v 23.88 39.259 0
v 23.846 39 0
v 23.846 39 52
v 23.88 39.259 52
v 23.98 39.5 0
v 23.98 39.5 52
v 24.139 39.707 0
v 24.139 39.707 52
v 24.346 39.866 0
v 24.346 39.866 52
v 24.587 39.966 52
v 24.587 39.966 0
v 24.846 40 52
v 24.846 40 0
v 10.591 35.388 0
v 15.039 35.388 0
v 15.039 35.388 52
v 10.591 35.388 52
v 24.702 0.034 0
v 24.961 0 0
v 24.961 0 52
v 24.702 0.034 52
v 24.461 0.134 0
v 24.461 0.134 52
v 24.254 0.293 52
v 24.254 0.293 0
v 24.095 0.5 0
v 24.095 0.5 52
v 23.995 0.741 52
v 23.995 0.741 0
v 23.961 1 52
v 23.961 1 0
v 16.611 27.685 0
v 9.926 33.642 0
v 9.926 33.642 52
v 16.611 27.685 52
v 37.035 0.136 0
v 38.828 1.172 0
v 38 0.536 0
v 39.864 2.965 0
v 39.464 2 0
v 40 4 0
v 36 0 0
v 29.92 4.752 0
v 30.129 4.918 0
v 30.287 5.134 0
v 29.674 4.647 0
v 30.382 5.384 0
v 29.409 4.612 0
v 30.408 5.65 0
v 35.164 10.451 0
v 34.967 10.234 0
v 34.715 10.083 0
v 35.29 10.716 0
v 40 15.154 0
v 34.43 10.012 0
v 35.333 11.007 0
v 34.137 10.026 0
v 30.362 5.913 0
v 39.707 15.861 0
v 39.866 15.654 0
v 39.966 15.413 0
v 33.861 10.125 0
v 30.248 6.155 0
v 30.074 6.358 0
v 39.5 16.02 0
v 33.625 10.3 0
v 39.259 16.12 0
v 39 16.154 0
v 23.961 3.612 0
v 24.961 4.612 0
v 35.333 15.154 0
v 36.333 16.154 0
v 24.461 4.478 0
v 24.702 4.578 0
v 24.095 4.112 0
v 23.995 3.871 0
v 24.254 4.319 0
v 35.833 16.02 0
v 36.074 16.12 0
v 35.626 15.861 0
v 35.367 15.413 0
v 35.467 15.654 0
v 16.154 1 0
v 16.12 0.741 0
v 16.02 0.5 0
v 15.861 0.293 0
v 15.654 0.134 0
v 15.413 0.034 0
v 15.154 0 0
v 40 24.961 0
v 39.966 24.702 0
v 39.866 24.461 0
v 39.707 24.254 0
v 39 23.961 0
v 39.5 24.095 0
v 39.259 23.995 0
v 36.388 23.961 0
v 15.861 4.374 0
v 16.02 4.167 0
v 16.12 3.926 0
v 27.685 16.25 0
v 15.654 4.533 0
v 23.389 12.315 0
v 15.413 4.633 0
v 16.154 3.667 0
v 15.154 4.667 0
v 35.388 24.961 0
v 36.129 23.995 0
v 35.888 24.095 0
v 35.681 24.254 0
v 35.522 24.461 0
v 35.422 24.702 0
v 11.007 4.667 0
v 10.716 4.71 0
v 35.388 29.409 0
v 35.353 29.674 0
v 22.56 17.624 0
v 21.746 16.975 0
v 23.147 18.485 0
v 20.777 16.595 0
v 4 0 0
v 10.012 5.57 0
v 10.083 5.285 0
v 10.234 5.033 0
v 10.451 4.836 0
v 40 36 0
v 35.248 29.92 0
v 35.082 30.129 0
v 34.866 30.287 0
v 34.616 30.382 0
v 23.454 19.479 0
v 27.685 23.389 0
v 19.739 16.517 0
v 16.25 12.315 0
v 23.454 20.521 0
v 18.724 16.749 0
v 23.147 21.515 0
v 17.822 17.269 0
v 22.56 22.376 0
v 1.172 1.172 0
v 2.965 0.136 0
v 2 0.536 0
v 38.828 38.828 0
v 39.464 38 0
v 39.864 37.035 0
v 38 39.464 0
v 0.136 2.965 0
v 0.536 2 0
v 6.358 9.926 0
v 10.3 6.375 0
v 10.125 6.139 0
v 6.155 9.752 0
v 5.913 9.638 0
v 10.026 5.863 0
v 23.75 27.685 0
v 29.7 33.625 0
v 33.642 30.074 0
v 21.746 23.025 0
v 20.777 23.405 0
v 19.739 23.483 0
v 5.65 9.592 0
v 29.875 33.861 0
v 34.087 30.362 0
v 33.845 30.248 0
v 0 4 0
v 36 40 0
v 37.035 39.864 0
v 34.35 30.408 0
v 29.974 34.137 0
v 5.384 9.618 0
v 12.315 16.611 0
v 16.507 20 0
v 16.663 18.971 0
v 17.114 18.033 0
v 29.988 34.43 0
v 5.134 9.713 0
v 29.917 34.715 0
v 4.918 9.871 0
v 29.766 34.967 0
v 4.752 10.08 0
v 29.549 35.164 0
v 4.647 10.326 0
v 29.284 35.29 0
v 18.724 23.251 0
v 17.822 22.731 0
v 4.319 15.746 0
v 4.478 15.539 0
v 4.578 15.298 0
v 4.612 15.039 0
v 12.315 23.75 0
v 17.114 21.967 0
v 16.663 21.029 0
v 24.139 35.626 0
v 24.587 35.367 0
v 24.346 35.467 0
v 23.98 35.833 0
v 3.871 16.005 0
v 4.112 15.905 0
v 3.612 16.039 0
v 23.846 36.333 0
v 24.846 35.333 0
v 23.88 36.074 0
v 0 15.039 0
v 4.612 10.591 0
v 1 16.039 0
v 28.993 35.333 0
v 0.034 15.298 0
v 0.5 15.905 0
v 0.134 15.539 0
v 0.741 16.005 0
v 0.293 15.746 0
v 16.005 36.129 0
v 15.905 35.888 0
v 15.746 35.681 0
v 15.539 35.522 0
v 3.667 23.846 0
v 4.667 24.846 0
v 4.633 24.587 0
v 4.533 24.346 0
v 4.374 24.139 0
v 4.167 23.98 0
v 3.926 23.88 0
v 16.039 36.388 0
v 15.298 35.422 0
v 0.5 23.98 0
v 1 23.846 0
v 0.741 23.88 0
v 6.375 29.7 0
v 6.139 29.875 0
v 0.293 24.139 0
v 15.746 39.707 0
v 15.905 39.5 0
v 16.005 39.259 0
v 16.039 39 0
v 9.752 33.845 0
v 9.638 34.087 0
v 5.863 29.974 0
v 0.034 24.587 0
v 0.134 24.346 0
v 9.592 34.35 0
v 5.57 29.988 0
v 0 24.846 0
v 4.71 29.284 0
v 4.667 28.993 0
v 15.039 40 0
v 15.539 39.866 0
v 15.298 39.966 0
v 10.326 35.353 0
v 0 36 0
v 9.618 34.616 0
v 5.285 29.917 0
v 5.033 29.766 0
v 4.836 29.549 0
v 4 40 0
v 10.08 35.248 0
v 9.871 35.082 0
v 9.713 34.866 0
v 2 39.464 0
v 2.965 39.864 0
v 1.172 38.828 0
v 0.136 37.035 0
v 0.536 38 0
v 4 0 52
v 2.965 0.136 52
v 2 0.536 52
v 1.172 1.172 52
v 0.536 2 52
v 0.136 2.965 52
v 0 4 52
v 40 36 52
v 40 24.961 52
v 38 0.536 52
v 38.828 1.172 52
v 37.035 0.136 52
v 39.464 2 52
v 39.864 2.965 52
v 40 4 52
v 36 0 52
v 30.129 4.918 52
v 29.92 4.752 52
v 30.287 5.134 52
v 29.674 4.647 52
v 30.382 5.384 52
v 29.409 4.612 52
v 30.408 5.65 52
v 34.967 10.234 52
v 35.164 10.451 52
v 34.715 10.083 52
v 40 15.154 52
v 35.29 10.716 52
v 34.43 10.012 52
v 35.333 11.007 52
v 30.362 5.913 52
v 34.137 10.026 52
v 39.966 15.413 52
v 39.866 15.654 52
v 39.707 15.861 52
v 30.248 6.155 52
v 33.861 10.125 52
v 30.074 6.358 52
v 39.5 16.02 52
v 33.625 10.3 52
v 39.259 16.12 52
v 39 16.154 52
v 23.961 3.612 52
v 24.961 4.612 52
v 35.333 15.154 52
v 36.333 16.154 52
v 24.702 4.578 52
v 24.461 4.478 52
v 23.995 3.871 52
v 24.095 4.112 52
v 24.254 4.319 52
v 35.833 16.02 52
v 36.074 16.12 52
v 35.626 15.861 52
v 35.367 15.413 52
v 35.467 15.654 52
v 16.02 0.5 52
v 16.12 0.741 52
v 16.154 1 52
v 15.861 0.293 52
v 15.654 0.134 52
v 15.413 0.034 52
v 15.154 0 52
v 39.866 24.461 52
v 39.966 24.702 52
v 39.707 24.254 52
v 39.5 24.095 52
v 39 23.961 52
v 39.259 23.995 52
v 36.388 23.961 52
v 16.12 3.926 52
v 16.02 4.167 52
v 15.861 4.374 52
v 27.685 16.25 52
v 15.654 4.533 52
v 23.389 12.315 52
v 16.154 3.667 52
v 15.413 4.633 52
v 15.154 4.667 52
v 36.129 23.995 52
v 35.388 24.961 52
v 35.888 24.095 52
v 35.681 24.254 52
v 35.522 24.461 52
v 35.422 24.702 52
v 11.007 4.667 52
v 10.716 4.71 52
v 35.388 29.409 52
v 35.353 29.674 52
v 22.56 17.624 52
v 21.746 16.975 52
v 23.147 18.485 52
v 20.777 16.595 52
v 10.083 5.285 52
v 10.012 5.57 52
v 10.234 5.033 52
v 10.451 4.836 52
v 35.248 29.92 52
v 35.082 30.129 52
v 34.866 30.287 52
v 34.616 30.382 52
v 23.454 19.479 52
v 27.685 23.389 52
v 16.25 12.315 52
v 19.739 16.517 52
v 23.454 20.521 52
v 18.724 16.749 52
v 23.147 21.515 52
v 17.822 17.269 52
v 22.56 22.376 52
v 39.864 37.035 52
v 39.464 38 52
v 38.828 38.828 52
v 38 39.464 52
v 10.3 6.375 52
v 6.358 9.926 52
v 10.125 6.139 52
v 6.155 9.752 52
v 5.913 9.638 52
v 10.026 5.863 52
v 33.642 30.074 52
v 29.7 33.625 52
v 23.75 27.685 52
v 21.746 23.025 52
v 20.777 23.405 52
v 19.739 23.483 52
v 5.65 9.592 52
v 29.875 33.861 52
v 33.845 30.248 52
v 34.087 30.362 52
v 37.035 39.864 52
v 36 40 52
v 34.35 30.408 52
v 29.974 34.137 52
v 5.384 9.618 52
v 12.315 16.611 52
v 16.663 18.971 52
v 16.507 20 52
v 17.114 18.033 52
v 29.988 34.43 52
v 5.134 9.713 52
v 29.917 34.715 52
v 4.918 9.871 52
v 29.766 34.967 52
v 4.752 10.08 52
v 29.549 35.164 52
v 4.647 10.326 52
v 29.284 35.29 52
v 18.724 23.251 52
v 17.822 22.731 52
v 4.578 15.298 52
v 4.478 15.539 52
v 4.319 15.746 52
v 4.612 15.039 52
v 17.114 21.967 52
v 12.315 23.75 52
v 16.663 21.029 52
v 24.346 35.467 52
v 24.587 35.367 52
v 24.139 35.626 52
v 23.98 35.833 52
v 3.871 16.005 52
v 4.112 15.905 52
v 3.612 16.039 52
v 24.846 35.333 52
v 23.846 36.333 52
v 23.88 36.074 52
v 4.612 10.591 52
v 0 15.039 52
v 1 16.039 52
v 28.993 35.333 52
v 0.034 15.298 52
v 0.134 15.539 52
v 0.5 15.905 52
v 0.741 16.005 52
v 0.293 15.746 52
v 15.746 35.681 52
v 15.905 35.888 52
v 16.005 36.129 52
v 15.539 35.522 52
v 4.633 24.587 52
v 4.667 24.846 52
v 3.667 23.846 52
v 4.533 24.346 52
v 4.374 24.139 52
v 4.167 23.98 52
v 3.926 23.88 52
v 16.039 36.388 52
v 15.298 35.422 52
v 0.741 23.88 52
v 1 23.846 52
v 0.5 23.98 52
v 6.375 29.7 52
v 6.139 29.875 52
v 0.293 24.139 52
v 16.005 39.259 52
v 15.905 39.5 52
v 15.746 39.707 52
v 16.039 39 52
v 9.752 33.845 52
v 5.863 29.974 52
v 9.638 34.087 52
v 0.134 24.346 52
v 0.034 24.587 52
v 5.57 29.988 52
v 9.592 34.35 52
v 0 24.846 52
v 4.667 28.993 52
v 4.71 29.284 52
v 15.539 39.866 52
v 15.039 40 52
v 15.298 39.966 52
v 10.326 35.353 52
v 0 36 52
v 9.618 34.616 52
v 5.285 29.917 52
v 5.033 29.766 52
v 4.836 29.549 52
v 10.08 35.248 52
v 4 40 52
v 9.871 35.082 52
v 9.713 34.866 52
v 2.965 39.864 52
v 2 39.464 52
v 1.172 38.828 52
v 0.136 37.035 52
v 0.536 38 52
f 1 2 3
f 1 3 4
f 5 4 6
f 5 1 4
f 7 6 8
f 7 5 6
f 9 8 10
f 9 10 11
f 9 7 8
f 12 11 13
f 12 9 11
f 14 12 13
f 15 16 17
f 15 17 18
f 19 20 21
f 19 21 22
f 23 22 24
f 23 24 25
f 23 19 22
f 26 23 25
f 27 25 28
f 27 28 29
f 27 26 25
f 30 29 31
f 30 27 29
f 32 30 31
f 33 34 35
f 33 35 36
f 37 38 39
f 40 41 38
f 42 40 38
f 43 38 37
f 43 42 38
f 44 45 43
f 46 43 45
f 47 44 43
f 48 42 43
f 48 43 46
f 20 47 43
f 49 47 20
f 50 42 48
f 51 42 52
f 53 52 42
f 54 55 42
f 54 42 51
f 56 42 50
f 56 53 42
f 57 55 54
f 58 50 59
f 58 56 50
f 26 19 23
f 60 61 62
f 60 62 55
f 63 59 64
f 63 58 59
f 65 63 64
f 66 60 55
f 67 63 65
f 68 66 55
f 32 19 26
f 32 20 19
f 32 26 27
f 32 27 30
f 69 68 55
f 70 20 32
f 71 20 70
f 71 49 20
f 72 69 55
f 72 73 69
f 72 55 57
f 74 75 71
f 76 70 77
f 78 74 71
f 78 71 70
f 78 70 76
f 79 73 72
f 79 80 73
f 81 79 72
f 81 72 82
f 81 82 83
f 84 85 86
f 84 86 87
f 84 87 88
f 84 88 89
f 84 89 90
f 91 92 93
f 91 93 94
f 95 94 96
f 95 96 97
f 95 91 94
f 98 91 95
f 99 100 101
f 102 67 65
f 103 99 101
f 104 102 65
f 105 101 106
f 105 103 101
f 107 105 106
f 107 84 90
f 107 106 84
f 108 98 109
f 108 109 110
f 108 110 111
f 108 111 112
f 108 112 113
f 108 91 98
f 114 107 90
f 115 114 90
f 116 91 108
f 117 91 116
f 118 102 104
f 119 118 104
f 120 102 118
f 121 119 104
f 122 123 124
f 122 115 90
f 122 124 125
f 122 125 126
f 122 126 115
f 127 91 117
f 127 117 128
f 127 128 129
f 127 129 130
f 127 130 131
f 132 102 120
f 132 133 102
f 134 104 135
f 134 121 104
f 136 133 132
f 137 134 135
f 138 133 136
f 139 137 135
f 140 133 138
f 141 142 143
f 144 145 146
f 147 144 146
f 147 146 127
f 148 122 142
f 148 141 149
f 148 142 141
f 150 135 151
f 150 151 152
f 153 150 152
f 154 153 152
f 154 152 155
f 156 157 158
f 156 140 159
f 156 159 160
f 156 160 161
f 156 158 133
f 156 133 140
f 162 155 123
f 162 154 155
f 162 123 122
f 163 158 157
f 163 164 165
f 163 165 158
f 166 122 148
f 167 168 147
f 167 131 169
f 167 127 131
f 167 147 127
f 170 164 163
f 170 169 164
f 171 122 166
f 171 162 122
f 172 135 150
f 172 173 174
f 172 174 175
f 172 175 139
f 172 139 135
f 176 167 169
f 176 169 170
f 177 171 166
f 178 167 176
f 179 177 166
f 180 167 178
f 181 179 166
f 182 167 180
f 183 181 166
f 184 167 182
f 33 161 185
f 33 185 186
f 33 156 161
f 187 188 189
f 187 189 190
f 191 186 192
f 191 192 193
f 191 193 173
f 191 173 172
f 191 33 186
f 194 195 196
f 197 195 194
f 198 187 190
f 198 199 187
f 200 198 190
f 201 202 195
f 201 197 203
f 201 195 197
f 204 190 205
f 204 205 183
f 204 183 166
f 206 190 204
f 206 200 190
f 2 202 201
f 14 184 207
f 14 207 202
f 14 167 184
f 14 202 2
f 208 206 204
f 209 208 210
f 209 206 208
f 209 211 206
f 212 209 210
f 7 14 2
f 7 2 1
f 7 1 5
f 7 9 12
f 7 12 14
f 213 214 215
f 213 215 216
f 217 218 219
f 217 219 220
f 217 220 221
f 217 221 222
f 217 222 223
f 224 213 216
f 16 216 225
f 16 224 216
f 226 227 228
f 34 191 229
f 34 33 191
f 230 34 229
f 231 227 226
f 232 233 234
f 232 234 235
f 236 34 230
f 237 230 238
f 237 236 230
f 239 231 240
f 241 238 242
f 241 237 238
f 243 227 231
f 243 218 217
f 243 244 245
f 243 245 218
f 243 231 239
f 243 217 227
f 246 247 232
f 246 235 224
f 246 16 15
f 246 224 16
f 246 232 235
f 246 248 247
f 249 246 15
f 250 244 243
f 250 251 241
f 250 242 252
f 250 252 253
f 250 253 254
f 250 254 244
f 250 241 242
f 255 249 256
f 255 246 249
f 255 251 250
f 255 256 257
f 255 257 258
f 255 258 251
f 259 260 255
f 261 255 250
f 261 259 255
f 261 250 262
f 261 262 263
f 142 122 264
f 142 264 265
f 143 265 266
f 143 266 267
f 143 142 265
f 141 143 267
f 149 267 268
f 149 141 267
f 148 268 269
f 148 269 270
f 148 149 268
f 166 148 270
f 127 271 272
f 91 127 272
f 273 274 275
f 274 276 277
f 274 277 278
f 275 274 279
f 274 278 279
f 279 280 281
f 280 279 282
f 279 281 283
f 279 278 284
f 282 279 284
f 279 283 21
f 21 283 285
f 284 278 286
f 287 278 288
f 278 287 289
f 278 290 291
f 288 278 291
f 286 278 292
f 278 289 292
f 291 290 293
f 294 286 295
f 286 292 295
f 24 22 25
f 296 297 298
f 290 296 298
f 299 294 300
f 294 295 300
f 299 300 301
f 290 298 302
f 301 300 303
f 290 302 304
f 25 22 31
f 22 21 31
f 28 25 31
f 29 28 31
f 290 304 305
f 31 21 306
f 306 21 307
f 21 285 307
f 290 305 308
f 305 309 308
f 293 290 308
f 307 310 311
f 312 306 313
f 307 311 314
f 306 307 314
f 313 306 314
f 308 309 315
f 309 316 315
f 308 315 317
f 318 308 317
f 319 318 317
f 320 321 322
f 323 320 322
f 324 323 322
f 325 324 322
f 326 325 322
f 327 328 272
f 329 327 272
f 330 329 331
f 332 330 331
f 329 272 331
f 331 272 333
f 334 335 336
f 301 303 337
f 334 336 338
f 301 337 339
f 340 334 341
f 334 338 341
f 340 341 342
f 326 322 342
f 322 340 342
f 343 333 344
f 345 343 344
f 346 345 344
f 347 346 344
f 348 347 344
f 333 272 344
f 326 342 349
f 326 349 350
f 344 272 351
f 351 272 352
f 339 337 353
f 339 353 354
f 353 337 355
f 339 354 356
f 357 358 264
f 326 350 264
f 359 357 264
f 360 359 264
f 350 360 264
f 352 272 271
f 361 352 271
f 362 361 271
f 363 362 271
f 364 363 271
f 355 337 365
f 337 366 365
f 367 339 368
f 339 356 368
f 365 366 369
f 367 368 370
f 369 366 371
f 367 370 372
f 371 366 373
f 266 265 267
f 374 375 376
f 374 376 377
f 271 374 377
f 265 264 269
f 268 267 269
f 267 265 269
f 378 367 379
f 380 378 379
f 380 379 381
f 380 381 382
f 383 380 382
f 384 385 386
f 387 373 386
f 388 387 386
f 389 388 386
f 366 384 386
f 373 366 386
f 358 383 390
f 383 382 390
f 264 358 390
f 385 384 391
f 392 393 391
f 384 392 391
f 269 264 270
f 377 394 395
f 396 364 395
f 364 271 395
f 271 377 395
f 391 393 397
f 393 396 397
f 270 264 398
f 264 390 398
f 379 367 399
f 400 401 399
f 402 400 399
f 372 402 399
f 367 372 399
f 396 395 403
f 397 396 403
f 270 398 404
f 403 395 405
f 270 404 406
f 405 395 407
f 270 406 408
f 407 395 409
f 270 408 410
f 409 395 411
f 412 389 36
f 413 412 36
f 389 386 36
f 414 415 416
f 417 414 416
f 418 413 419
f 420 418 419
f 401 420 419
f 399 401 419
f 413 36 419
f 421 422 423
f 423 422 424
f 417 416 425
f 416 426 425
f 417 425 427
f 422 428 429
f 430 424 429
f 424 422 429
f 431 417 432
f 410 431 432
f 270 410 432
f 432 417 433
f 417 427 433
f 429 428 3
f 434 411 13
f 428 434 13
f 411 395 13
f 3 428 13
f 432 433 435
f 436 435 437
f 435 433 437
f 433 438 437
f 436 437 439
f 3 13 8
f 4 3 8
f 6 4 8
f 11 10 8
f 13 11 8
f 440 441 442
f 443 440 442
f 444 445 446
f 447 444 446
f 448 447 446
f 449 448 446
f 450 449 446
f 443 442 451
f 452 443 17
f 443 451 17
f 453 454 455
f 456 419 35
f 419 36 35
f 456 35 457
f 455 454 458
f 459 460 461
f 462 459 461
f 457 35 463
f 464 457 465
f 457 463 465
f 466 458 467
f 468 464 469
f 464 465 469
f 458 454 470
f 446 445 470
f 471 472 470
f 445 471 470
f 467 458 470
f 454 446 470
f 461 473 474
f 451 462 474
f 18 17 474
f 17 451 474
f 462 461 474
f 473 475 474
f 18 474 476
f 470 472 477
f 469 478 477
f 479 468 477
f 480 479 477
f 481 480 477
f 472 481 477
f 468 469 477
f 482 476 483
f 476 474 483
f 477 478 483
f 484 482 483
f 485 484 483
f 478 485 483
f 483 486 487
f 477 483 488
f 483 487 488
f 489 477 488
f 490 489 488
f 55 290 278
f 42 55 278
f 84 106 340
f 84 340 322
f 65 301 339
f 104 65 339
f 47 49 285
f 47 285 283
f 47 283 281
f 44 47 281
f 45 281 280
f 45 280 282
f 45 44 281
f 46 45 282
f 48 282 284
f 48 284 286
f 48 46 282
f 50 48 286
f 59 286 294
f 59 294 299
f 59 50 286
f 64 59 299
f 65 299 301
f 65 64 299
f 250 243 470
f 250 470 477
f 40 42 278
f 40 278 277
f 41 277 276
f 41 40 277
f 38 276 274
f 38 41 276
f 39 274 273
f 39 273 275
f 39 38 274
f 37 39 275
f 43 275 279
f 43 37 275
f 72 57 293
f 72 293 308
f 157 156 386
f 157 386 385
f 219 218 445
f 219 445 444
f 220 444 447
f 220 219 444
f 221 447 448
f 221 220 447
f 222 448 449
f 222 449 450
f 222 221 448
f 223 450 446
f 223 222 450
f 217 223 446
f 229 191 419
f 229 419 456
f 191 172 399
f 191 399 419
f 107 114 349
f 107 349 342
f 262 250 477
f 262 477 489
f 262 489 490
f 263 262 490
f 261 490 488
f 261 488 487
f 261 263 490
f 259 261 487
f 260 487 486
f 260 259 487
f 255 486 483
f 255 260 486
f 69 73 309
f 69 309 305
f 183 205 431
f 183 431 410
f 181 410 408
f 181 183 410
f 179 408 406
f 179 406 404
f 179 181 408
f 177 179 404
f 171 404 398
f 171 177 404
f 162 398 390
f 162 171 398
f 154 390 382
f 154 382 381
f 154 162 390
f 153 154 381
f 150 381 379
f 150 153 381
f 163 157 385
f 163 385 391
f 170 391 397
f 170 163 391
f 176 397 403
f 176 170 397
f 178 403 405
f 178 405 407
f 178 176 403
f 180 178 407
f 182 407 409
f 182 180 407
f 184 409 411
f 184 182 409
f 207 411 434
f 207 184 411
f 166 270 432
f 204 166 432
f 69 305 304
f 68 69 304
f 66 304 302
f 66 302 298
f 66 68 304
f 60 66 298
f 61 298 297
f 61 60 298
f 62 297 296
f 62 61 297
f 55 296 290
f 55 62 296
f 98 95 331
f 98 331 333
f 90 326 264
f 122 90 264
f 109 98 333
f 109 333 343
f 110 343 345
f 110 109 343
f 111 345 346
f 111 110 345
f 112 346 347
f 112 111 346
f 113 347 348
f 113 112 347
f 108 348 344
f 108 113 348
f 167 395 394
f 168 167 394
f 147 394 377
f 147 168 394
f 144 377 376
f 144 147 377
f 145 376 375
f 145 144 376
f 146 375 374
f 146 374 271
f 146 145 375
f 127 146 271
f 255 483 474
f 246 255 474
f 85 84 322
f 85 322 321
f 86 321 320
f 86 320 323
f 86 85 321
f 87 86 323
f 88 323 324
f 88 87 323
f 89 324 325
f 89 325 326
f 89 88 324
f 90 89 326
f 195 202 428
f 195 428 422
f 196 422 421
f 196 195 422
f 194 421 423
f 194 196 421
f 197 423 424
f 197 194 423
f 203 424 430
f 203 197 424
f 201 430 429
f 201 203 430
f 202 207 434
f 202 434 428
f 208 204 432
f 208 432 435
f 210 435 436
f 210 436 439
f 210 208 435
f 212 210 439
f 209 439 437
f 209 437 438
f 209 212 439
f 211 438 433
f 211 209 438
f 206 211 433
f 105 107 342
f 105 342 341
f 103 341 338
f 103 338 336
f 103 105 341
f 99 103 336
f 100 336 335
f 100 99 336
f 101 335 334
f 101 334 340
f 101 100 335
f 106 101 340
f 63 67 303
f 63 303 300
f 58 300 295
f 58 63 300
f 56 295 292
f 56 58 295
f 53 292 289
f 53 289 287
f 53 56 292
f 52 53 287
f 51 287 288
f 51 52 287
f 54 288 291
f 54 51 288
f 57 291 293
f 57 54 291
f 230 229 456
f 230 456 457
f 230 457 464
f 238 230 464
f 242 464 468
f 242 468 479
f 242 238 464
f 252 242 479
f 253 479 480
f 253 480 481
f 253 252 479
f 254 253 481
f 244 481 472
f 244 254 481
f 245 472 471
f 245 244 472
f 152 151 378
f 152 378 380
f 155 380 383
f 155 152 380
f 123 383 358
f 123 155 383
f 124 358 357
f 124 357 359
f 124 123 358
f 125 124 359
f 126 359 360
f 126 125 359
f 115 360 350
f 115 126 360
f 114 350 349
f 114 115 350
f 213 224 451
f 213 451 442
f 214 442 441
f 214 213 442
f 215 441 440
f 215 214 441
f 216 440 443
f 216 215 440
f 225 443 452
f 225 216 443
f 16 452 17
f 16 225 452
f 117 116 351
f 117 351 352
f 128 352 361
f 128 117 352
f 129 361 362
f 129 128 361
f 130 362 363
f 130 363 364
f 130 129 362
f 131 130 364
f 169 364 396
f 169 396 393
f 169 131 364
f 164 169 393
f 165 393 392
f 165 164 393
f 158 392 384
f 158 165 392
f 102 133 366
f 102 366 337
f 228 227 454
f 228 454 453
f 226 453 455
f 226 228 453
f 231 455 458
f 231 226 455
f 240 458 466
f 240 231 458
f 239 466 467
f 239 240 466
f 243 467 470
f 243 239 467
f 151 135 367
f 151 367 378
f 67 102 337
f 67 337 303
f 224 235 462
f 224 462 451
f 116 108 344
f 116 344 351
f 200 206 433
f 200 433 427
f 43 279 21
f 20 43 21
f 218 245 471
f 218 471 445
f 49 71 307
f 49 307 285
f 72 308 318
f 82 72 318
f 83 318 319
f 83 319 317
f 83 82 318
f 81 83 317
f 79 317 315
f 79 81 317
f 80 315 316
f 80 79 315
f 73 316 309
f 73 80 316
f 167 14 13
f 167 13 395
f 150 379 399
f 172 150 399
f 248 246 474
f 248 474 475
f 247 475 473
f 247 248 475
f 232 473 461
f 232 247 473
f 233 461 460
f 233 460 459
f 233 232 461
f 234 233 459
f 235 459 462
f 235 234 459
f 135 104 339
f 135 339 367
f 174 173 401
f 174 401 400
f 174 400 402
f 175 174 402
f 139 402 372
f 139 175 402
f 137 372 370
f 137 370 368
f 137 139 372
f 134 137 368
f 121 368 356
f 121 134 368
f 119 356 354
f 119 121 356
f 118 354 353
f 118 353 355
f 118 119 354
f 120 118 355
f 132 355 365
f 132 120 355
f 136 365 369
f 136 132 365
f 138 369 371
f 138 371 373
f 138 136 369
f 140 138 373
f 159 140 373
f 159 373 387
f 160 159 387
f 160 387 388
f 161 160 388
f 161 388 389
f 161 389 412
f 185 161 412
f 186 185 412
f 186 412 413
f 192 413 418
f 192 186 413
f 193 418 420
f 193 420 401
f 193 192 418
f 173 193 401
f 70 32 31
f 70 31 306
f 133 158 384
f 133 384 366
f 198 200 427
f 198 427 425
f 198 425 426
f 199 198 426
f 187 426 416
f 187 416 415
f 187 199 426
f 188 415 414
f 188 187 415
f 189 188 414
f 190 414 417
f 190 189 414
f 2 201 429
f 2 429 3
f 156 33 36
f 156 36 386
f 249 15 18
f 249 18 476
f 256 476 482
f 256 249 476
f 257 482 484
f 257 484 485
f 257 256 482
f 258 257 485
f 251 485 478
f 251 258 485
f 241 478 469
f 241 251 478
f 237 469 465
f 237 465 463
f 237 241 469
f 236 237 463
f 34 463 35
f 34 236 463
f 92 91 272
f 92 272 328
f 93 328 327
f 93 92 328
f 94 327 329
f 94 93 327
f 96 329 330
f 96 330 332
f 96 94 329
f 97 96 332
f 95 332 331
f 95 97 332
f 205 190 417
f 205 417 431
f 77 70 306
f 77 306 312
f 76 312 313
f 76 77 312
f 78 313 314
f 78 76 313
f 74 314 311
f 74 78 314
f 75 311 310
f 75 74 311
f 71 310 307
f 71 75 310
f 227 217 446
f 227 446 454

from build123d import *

# Parameters (mm, degrees)
SKETCH2_R           = 3.492543695
BOSS_EXTRUDE1_DEPTH = 52


with BuildPart() as part:
    # Sketch2 → Boss-Extrude1 (new body)
    with BuildSketch(Plane.XY):
        with BuildLine():
            Line((19.48831917, 27.684671829), (23.749889801, 27.684671829))
            Line((23.749889801, 27.684671829), (29.699681879, 33.624984685))
            ThreePointArc((29.699681879, 33.624984685), (29.917171057, 34.714970099), (28.993139054, 35.332654972))
            Line((28.993139054, 35.332654972), (24.845630957, 35.332654972))
            ThreePointArc((24.845630957, 35.332654972), (24.138524175, 35.625548191), (23.845630957, 36.332654972))
            Line((23.845630957, 36.332654972), (23.845630957, 39))
            ThreePointArc((23.845630957, 39), (24.138524175, 39.707106781), (24.845630957, 40))
            Line((24.845630957, 40), (36, 40))
            ThreePointArc((36, 40), (38.828427125, 38.828427125), (40, 36))
            Line((40, 36), (40, 24.961087436))
            ThreePointArc((40, 24.961087436), (39.707106781, 24.253980655), (39, 23.961087436))
            Line((39, 23.961087436), (36.388269628, 23.961087436))
            ThreePointArc((36.388269628, 23.961087436), (35.681162846, 24.253980655), (35.388269628, 24.961087436))
            Line((35.388269628, 24.961087436), (35.388269628, 29.408620307))
            ThreePointArc((35.388269628, 29.408620307), (34.744223919, 30.343123673), (33.641676542, 30.073901274))
            Line((33.641676542, 30.073901274), (27.684671829, 23.388818206))
            Line((27.684671829, 23.388818206), (27.684671829, 20.51168083))
            Line((27.684671829, 20.51168083), (27.684671829, 16.250110199))
            Line((27.684671829, 16.250110199), (33.624984685, 10.300318121))
            ThreePointArc((33.624984685, 10.300318121), (34.714970099, 10.082828943), (35.332654972, 11.006860946))
            Line((35.332654972, 11.006860946), (35.332654972, 15.154369043))
            ThreePointArc((35.332654972, 15.154369043), (35.625548191, 15.861475825), (36.332654972, 16.154369043))
            Line((36.332654972, 16.154369043), (39, 16.154369043))
            ThreePointArc((39, 16.154369043), (39.707106781, 15.861475825), (40, 15.154369043))
            Line((40, 15.154369043), (40, 4))
            ThreePointArc((40, 4), (38.828427125, 1.171572875), (36, 0))
            Line((36, 0), (24.961087436, 0))
            ThreePointArc((24.961087436, 0), (24.253980655, 0.292893219), (23.961087436, 1))
            Line((23.961087436, 1), (23.961087436, 3.611730372))
            ThreePointArc((23.961087436, 3.611730372), (24.253980655, 4.318837154), (24.961087436, 4.611730372))
            Line((24.961087436, 4.611730372), (29.408620307, 4.611730372))
            ThreePointArc((29.408620307, 4.611730372), (30.343123673, 5.255776081), (30.073901274, 6.358323458))
            Line((30.073901274, 6.358323458), (23.388818206, 12.315328171))
            Line((23.388818206, 12.315328171), (20.51168083, 12.315328171))
            Line((20.51168083, 12.315328171), (16.250110199, 12.315328171))
            Line((16.250110199, 12.315328171), (10.300318121, 6.375015315))
            ThreePointArc((10.300318121, 6.375015315), (10.082828943, 5.285029901), (11.006860946, 4.667345028))
            Line((11.006860946, 4.667345028), (15.154369043, 4.667345028))
            ThreePointArc((15.154369043, 4.667345028), (15.861475825, 4.374451809), (16.154369043, 3.667345028))
            Line((16.154369043, 3.667345028), (16.154369043, 1))
            ThreePointArc((16.154369043, 1), (15.861475825, 0.292893219), (15.154369043, 0))
            Line((15.154369043, 0), (4, 0))
            ThreePointArc((4, 0), (1.171572875, 1.171572875), (0, 4))
            Line((0, 4), (0, 15.038912564))
            ThreePointArc((0, 15.038912564), (0.292893219, 15.746019345), (1, 16.038912564))
            Line((1, 16.038912564), (3.611730372, 16.038912564))
            ThreePointArc((3.611730372, 16.038912564), (4.318837154, 15.746019345), (4.611730372, 15.038912564))
            Line((4.611730372, 15.038912564), (4.611730372, 10.591379693))
            ThreePointArc((4.611730372, 10.591379693), (5.255776081, 9.656876327), (6.358323458, 9.926098726))
            Line((6.358323458, 9.926098726), (12.315328171, 16.611181794))
            Line((12.315328171, 16.611181794), (12.315328171, 19.48831917))
            Line((12.315328171, 19.48831917), (12.315328171, 23.749889801))
            Line((12.315328171, 23.749889801), (6.375015315, 29.699681879))
            ThreePointArc((6.375015315, 29.699681879), (5.285029901, 29.917171057), (4.667345028, 28.993139054))
            Line((4.667345028, 28.993139054), (4.667345028, 24.845630957))
            ThreePointArc((4.667345028, 24.845630957), (4.374451809, 24.138524175), (3.667345028, 23.845630957))
            Line((3.667345028, 23.845630957), (1, 23.845630957))
            ThreePointArc((1, 23.845630957), (0.292893219, 24.138524175), (0, 24.845630957))
            Line((0, 24.845630957), (0, 36))
            ThreePointArc((0, 36), (1.171572875, 38.828427125), (4, 40))
            Line((4, 40), (15.038912564, 40))
            ThreePointArc((15.038912564, 40), (15.746019345, 39.707106781), (16.038912564, 39))
            Line((16.038912564, 39), (16.038912564, 36.388269628))
            ThreePointArc((16.038912564, 36.388269628), (15.746019345, 35.681162846), (15.038912564, 35.388269628))
            Line((15.038912564, 35.388269628), (10.591379693, 35.388269628))
            ThreePointArc((10.591379693, 35.388269628), (9.656876327, 34.744223919), (9.926098726, 33.641676542))
            Line((9.926098726, 33.641676542), (16.611181794, 27.684671829))
            Line((16.611181794, 27.684671829), (19.48831917, 27.684671829))
        make_face()
        with Locations(Location((20, 20, 0), (0, 0, 180))):
            Circle(SKETCH2_R, mode=Mode.SUBTRACT)
    extrude(amount=BOSS_EXTRUDE1_DEPTH)


solid = part.part
